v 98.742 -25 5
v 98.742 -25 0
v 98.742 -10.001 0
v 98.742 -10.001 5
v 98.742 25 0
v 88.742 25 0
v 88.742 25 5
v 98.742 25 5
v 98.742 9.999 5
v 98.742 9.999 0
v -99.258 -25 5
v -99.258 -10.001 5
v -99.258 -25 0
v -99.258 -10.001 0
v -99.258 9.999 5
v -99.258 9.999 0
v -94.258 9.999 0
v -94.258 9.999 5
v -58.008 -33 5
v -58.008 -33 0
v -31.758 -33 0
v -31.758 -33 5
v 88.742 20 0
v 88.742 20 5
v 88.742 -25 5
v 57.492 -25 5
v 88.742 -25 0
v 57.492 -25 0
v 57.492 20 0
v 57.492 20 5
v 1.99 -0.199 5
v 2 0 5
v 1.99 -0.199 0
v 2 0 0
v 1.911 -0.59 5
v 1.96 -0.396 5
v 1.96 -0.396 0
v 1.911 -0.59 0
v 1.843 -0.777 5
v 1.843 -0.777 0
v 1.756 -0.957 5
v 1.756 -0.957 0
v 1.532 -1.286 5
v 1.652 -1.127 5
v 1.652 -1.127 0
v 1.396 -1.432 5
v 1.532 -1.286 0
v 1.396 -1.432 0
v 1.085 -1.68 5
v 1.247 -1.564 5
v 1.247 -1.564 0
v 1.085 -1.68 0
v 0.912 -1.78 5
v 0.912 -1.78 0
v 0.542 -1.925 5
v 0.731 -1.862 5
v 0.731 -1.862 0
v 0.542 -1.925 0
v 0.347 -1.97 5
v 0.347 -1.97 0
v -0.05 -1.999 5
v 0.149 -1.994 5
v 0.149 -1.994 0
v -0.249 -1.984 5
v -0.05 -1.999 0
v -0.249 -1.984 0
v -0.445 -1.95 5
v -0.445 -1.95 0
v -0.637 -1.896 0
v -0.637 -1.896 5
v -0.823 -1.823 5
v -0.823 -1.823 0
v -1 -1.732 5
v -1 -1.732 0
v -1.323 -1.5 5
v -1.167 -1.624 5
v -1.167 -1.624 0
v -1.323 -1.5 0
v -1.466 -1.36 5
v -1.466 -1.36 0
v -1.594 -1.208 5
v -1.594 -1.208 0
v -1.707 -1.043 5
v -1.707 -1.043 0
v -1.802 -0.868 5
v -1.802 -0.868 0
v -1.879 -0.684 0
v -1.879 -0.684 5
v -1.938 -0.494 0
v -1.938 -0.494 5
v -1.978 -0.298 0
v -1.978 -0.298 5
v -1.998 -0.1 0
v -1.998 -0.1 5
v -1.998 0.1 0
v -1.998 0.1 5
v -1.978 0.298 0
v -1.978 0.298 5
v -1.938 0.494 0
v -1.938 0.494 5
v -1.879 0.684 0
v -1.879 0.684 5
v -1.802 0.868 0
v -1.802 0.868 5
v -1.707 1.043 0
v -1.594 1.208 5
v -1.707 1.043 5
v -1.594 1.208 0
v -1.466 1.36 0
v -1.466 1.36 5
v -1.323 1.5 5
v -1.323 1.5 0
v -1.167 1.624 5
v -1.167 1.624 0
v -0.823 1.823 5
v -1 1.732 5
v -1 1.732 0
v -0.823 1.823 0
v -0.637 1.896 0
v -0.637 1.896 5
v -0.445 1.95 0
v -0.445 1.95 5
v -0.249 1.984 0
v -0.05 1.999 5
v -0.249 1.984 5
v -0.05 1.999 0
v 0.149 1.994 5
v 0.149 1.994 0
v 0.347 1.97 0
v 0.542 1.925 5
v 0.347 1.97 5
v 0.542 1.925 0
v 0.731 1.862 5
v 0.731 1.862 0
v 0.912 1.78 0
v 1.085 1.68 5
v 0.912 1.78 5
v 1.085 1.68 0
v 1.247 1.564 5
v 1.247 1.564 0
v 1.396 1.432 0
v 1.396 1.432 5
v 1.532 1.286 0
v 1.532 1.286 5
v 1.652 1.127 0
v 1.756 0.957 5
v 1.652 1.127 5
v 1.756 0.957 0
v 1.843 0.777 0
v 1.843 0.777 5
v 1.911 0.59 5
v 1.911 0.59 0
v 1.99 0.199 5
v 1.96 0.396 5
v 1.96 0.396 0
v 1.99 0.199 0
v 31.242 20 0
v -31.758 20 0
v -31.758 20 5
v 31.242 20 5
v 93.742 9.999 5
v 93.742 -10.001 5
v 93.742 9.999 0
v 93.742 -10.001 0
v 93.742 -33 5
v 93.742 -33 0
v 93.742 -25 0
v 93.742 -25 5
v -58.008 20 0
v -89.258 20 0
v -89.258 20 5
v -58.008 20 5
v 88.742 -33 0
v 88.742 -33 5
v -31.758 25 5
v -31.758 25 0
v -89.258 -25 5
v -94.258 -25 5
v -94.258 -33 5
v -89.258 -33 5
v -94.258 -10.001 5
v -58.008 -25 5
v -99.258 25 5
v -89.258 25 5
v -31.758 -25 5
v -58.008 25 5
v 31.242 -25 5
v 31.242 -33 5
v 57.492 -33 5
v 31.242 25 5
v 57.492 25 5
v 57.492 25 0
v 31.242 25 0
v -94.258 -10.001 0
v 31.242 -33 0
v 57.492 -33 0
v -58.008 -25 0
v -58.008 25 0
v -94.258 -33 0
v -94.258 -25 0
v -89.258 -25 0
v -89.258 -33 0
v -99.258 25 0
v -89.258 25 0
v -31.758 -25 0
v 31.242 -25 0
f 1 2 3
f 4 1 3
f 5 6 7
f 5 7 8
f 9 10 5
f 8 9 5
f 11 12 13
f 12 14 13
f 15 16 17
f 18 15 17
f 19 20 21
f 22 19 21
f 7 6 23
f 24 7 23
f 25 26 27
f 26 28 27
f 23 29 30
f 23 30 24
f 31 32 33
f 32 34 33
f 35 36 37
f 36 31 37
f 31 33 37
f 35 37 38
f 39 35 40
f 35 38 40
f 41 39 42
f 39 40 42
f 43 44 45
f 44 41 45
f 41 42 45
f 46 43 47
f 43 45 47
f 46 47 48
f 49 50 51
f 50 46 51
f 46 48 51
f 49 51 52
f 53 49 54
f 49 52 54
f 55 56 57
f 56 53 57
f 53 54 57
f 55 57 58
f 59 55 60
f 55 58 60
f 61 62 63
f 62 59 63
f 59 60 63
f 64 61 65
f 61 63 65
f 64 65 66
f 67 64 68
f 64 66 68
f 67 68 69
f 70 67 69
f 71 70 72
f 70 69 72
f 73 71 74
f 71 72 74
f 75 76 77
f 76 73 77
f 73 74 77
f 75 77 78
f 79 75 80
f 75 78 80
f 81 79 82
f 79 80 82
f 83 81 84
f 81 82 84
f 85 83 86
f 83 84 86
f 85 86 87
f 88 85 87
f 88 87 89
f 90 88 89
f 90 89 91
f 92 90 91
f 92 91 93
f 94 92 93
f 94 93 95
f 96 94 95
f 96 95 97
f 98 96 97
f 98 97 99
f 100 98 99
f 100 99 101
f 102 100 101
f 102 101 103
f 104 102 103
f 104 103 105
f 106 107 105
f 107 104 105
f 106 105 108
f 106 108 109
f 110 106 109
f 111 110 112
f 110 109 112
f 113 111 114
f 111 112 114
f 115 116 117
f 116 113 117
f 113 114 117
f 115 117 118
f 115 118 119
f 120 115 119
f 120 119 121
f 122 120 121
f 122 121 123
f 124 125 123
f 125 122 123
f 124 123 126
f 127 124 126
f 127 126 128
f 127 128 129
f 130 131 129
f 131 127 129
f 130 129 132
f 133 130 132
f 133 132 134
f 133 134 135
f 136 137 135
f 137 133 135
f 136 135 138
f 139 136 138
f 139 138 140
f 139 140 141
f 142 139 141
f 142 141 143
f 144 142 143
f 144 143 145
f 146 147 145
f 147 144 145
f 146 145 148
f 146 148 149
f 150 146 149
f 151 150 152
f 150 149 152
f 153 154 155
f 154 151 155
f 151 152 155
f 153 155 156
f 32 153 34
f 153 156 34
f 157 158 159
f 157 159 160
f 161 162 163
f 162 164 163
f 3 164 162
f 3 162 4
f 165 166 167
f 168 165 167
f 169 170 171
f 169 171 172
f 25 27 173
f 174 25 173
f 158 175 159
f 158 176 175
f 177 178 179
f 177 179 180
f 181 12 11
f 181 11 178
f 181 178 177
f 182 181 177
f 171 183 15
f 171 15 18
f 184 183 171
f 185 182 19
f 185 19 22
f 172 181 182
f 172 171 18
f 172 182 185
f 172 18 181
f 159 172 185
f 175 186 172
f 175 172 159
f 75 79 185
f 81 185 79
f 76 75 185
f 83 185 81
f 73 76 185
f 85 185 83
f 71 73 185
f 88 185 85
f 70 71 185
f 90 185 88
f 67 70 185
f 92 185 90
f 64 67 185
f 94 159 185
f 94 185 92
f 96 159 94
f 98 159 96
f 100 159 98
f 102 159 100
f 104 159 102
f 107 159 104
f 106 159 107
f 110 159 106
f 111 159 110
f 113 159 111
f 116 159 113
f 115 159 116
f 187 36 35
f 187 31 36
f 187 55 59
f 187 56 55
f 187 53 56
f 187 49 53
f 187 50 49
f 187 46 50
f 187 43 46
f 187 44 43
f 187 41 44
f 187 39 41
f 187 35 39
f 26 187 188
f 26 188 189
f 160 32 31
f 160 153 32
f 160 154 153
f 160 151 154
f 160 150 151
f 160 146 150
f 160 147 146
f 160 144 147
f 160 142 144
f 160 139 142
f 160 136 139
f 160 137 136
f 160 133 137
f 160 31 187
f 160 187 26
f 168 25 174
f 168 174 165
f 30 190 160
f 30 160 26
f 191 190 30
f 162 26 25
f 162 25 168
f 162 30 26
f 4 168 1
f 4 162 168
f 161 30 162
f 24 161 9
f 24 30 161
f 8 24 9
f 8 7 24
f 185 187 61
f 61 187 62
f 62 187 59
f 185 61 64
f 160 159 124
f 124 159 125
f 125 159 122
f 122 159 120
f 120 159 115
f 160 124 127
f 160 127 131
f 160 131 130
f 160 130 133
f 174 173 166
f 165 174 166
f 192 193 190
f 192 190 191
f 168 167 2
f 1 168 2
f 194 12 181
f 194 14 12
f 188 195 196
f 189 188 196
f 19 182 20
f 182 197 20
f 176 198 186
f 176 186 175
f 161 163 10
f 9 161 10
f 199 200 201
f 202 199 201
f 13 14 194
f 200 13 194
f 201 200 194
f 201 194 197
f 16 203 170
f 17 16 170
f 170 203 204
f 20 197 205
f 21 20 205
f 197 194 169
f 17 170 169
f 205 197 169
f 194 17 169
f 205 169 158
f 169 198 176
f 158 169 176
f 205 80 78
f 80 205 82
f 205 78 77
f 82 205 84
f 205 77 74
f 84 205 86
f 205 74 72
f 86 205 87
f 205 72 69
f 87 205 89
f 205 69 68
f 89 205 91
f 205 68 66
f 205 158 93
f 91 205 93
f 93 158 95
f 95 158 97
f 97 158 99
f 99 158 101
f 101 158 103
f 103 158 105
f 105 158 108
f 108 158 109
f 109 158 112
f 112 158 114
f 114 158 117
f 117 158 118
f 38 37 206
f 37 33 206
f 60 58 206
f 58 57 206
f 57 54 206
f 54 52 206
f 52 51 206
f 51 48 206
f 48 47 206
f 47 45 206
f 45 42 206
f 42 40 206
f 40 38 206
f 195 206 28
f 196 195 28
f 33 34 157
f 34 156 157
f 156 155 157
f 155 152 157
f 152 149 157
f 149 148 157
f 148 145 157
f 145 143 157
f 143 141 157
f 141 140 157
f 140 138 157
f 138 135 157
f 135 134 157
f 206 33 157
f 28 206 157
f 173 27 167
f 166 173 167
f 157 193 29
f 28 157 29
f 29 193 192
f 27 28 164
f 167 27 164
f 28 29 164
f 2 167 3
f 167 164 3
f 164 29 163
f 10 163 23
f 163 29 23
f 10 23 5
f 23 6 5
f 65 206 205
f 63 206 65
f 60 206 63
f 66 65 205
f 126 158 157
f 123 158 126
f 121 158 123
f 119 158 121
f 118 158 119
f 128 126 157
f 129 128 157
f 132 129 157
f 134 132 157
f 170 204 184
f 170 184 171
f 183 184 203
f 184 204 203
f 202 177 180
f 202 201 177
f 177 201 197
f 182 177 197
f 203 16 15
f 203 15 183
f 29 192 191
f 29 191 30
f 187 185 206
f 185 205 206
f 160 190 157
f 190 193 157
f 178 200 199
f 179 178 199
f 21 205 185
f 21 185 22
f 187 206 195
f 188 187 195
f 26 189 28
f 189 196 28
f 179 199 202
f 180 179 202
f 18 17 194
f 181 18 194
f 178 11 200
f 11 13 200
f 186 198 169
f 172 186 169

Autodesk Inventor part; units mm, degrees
ref_plane "YZ Plane" through (0, 0, 0) normal (1, 0, 0) x (0, 1, 0)
ref_plane "XZ Plane" through (0, 0, 0) normal (0, 1, 0) x (-1, 0, 0)
ref_plane "XY Plane" through (0, 0, 0) normal (0, 0, 1) x (1, 0, 0)
sketch "Sketch1" plane through (0, 0, 0) normal (0, 0, 1) x (1, 0, 0)
  line L0 (-89.2581, -25.0004) -> (-89.2581, -33.0004)
  line L1 (-89.2581, -25.0004) -> (-58.0081, -25.0004)
  line L2 (-58.0081, -25.0004) -> (-58.0081, -33.0004)
  line L3 (-31.7581, -25.0004) -> (-31.7581, -33.0004)
  line L4 (-31.7581, -25.0004) -> (31.2419, -25.0004)
  line L5 (31.2419, -25.0004) -> (31.2419, -33.0004)
  line L6 (93.7419, -25.0004) -> (98.7419, -25.0004)
  line L7 (98.7419, -25.0004) -> (98.7419, -10.0012)
  line L8 (93.7419, -10.0012) -> (98.7419, -10.0012)
  line L9 (93.7419, -10.0012) -> (93.7419, 9.9988)
  line L10 (93.7419, 9.9988) -> (98.7419, 9.9988)
  line L11 (98.7419, 9.9988) -> (98.7419, 25.0003)
  line L12 (-99.2581, 9.9988) -> (-99.2581, 25.0003)
  line L13 (-99.2581, 9.9988) -> (-94.2581, 9.9988)
  line L14 (-99.2581, -10.0012) -> (-99.2581, -25.0004)
  line L15 (-99.2581, -10.0012) -> (-94.2581, -10.0012)
  line L16 (-99.2581, -25.0004) -> (-94.2581, -25.0004)
  line L17 (-94.2581, 9.9988) -> (-94.2581, -10.0012)
  line L18 (-94.2581, -25.0004) -> (-94.2581, -33.0004)
  line L19 (93.7419, -33.0004) -> (93.7419, -25.0004)
  line L20 (-89.2581, 25.0003) -> (-89.2581, 20.0003)
  line L21 (-89.2581, 20.0003) -> (-58.0081, 20.0003)
  line L22 (-58.0081, 25.0003) -> (-58.0081, 20.0003)
  line L23 (-58.0081, 25.0003) -> (-31.7581, 25.0003)
  line L24 (-31.7581, 25.0003) -> (-31.7581, 20.0003)
  line L25 (-31.7581, 20.0003) -> (31.2419, 20.0003)
  line L26 (31.2419, 25.0003) -> (31.2419, 20.0003)
  line L27 (31.2419, 25.0003) -> (57.4919, 25.0003)
  line L28 (57.4919, 25.0003) -> (57.4919, 20.0003)
  line L29 (57.4919, 20.0003) -> (88.7419, 20.0003)
  line L30 (88.7419, 25.0003) -> (88.7419, 20.0003)
  line L31 (-89.2581, 25.0003) -> (-99.2581, 25.0003)
  line L32 (88.7419, 25.0003) -> (98.7419, 25.0003)
  circle A0 centre (0, 0) radius 2
  line L33 (57.4919, -33.0004) -> (57.4919, -25.0004)
  line L34 (57.4919, -25.0004) -> (88.7419, -25.0004)
  line L35 (88.7419, -25.0004) -> (88.7419, -33.0004)
  line L36 (88.7419, -33.0004) -> (93.7419, -33.0004)
  line L37 (31.2419, -33.0004) -> (57.4919, -33.0004)
  line L38 (-94.2581, -33.0004) -> (-89.2581, -33.0004)
  line L39 (-58.0081, -33.0004) -> (-31.7581, -33.0004)
  point P0 (-93.0453, -16.9364)
  dimension "d46" = 198
  dimension "d47" = 4
  dimension "d48" = 26.25
  dimension "d50" = 63
  dimension "d51" = 31.25
  dimension "d56" = 45.0007
  dimension "d57" = 50.0007
  dimension "d59" = 5
extrude "Extrusion3" add sketch "Sketch1" along normal blind 5
properties part number "case bottom sides" material "ABS Plastic"
